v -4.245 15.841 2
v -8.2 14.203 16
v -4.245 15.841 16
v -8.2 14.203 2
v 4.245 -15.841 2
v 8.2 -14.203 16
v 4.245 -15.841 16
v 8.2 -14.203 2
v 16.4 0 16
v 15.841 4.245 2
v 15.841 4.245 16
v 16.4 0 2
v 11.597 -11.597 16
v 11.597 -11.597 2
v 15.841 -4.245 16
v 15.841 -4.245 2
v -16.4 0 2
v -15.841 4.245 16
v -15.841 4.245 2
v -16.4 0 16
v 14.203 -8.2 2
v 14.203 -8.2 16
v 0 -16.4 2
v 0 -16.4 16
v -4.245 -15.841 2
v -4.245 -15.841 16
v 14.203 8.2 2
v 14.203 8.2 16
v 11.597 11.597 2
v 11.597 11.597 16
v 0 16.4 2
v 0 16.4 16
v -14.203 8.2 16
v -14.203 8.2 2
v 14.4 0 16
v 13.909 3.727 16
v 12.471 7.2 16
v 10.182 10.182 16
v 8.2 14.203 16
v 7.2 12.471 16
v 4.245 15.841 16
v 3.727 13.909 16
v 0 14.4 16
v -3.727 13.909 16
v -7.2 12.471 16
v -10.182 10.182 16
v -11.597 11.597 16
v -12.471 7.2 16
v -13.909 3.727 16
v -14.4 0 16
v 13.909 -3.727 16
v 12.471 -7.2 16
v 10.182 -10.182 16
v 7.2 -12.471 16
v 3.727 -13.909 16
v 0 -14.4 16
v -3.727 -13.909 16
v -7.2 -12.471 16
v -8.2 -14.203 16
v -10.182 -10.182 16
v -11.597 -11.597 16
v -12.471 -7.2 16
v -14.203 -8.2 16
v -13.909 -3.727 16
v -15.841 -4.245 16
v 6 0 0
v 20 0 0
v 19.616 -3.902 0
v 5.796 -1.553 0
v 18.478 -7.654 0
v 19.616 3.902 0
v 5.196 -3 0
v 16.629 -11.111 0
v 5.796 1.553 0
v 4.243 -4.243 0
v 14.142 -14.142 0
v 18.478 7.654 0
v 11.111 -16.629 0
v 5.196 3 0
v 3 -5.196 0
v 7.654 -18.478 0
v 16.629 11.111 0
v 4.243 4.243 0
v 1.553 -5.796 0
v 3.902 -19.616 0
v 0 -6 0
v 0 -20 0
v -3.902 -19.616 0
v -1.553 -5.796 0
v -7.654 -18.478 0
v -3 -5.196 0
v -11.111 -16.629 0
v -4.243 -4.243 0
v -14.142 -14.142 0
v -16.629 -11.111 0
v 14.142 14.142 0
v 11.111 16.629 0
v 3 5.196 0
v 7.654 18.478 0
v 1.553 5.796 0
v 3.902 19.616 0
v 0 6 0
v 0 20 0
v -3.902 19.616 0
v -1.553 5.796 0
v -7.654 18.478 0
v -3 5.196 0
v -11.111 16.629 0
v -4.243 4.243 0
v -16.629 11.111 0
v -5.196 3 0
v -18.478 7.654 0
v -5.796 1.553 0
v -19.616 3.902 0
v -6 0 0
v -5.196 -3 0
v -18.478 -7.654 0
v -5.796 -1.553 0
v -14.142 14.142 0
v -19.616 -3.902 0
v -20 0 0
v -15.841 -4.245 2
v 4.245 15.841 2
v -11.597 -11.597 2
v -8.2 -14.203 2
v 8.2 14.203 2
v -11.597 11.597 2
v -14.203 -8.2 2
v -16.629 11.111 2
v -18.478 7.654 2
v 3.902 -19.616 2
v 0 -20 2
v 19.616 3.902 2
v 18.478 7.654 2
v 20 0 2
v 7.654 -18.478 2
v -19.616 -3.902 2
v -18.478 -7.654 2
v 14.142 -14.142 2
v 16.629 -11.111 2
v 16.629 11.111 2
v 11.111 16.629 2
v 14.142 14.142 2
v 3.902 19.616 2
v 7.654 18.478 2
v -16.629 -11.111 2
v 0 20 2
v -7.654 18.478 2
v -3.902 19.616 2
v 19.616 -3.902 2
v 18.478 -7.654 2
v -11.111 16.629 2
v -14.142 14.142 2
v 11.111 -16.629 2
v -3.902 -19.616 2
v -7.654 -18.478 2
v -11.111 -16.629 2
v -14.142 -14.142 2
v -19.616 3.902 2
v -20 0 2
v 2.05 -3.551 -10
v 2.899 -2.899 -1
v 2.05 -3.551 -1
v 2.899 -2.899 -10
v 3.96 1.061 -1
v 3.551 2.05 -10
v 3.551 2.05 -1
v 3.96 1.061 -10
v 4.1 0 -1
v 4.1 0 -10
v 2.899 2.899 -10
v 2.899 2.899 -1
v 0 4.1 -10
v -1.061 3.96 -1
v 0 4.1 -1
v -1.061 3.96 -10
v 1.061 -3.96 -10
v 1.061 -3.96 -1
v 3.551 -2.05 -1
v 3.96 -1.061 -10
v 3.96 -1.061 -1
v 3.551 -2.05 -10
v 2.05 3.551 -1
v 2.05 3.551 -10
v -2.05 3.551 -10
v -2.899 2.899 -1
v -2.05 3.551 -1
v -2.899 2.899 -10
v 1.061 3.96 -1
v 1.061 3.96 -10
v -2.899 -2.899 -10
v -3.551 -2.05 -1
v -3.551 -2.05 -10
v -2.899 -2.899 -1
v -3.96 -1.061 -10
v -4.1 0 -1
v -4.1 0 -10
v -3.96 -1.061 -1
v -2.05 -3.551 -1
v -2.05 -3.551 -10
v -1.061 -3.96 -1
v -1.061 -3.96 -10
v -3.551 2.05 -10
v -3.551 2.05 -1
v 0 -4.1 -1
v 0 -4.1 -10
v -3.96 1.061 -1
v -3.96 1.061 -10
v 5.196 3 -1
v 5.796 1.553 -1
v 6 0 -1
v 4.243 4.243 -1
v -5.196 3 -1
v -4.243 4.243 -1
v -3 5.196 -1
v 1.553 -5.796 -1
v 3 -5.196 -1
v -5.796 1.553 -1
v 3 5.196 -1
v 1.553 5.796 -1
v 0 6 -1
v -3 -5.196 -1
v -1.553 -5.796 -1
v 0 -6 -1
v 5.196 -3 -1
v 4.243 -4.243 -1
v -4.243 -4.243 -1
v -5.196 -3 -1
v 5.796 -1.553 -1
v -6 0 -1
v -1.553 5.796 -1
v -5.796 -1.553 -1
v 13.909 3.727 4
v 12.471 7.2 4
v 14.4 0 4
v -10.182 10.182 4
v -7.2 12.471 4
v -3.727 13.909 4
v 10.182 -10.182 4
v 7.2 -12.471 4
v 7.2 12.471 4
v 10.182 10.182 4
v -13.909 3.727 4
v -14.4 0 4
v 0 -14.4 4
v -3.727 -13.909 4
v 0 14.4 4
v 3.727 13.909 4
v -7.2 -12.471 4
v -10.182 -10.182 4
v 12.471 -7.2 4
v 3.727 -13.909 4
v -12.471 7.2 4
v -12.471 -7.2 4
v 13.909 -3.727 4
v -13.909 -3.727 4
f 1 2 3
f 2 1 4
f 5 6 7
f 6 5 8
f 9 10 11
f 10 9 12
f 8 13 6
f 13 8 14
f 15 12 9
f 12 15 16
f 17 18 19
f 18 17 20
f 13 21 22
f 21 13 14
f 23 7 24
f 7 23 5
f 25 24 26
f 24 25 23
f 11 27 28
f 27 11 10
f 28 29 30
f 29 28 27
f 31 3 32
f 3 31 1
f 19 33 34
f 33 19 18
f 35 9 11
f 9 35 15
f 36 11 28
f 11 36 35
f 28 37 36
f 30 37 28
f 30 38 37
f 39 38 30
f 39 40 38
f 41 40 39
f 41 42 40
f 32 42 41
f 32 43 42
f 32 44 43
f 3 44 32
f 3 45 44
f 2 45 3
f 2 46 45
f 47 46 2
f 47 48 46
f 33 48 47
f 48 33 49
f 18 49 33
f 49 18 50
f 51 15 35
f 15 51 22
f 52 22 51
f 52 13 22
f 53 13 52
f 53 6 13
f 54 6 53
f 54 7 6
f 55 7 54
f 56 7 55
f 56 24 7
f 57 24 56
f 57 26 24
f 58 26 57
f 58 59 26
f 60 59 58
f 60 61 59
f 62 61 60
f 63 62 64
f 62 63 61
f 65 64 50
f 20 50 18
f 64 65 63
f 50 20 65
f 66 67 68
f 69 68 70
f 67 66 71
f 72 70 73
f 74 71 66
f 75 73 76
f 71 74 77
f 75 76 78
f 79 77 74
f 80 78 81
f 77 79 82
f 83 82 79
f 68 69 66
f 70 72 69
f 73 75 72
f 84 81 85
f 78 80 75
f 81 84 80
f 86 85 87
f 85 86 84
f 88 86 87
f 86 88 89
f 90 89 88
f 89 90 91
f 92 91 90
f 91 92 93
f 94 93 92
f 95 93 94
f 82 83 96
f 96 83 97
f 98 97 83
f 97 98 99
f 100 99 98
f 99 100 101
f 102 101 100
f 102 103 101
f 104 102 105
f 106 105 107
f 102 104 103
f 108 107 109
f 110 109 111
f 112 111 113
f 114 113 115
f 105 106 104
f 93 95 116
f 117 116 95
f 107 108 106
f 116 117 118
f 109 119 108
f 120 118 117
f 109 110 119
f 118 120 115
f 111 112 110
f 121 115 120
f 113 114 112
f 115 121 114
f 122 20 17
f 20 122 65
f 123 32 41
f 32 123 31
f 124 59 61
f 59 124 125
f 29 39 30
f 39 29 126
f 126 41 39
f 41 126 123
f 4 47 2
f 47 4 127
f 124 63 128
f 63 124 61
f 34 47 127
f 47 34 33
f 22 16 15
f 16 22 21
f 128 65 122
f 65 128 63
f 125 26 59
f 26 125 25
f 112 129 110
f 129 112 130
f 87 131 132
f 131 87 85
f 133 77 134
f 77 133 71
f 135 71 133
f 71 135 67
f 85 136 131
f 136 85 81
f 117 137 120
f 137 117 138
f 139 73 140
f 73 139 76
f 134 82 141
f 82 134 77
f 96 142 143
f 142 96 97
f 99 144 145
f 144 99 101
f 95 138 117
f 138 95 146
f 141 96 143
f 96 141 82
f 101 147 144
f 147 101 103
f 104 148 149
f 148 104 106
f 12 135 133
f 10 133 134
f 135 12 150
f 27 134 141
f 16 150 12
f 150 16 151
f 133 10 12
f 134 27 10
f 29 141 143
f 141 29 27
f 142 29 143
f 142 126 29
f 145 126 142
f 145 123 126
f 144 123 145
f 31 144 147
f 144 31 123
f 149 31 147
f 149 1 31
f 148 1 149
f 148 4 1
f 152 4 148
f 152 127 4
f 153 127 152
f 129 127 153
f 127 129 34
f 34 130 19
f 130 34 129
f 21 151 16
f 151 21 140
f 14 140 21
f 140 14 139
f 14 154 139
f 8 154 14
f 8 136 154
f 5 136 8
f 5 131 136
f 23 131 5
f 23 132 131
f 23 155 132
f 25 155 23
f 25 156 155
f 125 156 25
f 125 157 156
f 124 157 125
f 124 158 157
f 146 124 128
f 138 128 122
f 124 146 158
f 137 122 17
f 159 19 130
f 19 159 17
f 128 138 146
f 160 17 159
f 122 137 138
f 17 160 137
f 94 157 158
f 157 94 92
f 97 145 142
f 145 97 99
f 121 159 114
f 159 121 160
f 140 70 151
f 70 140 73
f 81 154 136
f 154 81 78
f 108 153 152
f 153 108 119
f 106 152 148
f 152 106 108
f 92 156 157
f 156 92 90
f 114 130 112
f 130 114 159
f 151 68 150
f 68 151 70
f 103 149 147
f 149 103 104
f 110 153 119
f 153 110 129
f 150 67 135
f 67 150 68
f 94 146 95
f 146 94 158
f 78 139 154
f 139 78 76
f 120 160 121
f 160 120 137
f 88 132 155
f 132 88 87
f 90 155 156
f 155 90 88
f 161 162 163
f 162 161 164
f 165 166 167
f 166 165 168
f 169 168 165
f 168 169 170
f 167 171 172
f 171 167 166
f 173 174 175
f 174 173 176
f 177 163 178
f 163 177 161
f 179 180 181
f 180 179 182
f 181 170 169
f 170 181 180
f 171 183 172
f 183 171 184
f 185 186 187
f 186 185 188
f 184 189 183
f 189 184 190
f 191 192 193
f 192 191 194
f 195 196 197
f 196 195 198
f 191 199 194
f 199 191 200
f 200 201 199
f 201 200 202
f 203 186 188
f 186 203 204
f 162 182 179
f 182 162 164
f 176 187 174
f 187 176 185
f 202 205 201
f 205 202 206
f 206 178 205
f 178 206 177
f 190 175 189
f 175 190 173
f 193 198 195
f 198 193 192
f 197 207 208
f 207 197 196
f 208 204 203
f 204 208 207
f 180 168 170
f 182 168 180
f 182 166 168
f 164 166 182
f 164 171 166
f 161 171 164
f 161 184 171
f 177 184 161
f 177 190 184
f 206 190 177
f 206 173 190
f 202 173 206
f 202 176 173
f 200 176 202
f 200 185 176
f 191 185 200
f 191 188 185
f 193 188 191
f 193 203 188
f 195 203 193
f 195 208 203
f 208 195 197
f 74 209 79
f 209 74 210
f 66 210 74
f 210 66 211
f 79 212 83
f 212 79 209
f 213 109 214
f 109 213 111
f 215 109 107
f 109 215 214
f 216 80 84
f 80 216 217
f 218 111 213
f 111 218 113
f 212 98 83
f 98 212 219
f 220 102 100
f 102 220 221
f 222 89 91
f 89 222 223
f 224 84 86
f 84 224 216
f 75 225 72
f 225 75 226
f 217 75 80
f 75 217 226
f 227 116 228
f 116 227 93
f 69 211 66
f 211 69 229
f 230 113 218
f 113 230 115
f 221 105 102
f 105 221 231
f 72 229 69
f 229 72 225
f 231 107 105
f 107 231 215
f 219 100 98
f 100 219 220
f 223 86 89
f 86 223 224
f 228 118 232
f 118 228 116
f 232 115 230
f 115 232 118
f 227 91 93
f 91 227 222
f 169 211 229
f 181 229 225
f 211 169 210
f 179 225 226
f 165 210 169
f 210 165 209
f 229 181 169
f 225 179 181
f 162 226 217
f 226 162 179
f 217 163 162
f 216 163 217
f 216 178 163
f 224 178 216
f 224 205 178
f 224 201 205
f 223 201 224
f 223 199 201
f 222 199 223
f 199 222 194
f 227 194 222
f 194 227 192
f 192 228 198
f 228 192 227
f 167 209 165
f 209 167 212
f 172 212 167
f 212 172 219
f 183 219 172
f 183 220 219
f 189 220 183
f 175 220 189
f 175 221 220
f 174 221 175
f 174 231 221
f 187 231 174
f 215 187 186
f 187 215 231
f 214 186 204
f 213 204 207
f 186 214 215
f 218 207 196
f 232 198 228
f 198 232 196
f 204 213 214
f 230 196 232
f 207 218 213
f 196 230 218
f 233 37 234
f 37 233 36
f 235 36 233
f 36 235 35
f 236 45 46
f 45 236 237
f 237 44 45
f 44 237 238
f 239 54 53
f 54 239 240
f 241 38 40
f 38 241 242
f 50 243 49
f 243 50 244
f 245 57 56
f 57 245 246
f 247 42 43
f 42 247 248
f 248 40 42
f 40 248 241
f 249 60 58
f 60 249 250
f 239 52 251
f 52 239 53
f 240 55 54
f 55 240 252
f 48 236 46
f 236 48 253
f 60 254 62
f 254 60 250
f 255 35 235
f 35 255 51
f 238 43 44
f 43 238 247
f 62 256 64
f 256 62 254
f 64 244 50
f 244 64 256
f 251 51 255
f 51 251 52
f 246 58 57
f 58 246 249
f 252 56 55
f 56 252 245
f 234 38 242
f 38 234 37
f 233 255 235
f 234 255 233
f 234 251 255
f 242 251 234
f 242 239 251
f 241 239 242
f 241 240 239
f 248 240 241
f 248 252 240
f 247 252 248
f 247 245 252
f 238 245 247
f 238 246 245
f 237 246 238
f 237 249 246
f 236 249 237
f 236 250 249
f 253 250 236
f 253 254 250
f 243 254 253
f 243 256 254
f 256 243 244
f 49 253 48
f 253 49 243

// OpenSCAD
difference()
{
	union()
	{
		cylinder(r=32.8/2,h=16,$fn=24);
		cylinder(r=40/2,h=2,$fn=32);
		translate([0,0,-10])
			cylinder(r=8.2/2,h=15,$fn=24 );
		translate([0,0,-1])
			cylinder(r=12/2,h=2,$fn=24);
	}
	translate([0,0,4])
		cylinder(r=32.8/2-2,h=20,$fn=24);
}
